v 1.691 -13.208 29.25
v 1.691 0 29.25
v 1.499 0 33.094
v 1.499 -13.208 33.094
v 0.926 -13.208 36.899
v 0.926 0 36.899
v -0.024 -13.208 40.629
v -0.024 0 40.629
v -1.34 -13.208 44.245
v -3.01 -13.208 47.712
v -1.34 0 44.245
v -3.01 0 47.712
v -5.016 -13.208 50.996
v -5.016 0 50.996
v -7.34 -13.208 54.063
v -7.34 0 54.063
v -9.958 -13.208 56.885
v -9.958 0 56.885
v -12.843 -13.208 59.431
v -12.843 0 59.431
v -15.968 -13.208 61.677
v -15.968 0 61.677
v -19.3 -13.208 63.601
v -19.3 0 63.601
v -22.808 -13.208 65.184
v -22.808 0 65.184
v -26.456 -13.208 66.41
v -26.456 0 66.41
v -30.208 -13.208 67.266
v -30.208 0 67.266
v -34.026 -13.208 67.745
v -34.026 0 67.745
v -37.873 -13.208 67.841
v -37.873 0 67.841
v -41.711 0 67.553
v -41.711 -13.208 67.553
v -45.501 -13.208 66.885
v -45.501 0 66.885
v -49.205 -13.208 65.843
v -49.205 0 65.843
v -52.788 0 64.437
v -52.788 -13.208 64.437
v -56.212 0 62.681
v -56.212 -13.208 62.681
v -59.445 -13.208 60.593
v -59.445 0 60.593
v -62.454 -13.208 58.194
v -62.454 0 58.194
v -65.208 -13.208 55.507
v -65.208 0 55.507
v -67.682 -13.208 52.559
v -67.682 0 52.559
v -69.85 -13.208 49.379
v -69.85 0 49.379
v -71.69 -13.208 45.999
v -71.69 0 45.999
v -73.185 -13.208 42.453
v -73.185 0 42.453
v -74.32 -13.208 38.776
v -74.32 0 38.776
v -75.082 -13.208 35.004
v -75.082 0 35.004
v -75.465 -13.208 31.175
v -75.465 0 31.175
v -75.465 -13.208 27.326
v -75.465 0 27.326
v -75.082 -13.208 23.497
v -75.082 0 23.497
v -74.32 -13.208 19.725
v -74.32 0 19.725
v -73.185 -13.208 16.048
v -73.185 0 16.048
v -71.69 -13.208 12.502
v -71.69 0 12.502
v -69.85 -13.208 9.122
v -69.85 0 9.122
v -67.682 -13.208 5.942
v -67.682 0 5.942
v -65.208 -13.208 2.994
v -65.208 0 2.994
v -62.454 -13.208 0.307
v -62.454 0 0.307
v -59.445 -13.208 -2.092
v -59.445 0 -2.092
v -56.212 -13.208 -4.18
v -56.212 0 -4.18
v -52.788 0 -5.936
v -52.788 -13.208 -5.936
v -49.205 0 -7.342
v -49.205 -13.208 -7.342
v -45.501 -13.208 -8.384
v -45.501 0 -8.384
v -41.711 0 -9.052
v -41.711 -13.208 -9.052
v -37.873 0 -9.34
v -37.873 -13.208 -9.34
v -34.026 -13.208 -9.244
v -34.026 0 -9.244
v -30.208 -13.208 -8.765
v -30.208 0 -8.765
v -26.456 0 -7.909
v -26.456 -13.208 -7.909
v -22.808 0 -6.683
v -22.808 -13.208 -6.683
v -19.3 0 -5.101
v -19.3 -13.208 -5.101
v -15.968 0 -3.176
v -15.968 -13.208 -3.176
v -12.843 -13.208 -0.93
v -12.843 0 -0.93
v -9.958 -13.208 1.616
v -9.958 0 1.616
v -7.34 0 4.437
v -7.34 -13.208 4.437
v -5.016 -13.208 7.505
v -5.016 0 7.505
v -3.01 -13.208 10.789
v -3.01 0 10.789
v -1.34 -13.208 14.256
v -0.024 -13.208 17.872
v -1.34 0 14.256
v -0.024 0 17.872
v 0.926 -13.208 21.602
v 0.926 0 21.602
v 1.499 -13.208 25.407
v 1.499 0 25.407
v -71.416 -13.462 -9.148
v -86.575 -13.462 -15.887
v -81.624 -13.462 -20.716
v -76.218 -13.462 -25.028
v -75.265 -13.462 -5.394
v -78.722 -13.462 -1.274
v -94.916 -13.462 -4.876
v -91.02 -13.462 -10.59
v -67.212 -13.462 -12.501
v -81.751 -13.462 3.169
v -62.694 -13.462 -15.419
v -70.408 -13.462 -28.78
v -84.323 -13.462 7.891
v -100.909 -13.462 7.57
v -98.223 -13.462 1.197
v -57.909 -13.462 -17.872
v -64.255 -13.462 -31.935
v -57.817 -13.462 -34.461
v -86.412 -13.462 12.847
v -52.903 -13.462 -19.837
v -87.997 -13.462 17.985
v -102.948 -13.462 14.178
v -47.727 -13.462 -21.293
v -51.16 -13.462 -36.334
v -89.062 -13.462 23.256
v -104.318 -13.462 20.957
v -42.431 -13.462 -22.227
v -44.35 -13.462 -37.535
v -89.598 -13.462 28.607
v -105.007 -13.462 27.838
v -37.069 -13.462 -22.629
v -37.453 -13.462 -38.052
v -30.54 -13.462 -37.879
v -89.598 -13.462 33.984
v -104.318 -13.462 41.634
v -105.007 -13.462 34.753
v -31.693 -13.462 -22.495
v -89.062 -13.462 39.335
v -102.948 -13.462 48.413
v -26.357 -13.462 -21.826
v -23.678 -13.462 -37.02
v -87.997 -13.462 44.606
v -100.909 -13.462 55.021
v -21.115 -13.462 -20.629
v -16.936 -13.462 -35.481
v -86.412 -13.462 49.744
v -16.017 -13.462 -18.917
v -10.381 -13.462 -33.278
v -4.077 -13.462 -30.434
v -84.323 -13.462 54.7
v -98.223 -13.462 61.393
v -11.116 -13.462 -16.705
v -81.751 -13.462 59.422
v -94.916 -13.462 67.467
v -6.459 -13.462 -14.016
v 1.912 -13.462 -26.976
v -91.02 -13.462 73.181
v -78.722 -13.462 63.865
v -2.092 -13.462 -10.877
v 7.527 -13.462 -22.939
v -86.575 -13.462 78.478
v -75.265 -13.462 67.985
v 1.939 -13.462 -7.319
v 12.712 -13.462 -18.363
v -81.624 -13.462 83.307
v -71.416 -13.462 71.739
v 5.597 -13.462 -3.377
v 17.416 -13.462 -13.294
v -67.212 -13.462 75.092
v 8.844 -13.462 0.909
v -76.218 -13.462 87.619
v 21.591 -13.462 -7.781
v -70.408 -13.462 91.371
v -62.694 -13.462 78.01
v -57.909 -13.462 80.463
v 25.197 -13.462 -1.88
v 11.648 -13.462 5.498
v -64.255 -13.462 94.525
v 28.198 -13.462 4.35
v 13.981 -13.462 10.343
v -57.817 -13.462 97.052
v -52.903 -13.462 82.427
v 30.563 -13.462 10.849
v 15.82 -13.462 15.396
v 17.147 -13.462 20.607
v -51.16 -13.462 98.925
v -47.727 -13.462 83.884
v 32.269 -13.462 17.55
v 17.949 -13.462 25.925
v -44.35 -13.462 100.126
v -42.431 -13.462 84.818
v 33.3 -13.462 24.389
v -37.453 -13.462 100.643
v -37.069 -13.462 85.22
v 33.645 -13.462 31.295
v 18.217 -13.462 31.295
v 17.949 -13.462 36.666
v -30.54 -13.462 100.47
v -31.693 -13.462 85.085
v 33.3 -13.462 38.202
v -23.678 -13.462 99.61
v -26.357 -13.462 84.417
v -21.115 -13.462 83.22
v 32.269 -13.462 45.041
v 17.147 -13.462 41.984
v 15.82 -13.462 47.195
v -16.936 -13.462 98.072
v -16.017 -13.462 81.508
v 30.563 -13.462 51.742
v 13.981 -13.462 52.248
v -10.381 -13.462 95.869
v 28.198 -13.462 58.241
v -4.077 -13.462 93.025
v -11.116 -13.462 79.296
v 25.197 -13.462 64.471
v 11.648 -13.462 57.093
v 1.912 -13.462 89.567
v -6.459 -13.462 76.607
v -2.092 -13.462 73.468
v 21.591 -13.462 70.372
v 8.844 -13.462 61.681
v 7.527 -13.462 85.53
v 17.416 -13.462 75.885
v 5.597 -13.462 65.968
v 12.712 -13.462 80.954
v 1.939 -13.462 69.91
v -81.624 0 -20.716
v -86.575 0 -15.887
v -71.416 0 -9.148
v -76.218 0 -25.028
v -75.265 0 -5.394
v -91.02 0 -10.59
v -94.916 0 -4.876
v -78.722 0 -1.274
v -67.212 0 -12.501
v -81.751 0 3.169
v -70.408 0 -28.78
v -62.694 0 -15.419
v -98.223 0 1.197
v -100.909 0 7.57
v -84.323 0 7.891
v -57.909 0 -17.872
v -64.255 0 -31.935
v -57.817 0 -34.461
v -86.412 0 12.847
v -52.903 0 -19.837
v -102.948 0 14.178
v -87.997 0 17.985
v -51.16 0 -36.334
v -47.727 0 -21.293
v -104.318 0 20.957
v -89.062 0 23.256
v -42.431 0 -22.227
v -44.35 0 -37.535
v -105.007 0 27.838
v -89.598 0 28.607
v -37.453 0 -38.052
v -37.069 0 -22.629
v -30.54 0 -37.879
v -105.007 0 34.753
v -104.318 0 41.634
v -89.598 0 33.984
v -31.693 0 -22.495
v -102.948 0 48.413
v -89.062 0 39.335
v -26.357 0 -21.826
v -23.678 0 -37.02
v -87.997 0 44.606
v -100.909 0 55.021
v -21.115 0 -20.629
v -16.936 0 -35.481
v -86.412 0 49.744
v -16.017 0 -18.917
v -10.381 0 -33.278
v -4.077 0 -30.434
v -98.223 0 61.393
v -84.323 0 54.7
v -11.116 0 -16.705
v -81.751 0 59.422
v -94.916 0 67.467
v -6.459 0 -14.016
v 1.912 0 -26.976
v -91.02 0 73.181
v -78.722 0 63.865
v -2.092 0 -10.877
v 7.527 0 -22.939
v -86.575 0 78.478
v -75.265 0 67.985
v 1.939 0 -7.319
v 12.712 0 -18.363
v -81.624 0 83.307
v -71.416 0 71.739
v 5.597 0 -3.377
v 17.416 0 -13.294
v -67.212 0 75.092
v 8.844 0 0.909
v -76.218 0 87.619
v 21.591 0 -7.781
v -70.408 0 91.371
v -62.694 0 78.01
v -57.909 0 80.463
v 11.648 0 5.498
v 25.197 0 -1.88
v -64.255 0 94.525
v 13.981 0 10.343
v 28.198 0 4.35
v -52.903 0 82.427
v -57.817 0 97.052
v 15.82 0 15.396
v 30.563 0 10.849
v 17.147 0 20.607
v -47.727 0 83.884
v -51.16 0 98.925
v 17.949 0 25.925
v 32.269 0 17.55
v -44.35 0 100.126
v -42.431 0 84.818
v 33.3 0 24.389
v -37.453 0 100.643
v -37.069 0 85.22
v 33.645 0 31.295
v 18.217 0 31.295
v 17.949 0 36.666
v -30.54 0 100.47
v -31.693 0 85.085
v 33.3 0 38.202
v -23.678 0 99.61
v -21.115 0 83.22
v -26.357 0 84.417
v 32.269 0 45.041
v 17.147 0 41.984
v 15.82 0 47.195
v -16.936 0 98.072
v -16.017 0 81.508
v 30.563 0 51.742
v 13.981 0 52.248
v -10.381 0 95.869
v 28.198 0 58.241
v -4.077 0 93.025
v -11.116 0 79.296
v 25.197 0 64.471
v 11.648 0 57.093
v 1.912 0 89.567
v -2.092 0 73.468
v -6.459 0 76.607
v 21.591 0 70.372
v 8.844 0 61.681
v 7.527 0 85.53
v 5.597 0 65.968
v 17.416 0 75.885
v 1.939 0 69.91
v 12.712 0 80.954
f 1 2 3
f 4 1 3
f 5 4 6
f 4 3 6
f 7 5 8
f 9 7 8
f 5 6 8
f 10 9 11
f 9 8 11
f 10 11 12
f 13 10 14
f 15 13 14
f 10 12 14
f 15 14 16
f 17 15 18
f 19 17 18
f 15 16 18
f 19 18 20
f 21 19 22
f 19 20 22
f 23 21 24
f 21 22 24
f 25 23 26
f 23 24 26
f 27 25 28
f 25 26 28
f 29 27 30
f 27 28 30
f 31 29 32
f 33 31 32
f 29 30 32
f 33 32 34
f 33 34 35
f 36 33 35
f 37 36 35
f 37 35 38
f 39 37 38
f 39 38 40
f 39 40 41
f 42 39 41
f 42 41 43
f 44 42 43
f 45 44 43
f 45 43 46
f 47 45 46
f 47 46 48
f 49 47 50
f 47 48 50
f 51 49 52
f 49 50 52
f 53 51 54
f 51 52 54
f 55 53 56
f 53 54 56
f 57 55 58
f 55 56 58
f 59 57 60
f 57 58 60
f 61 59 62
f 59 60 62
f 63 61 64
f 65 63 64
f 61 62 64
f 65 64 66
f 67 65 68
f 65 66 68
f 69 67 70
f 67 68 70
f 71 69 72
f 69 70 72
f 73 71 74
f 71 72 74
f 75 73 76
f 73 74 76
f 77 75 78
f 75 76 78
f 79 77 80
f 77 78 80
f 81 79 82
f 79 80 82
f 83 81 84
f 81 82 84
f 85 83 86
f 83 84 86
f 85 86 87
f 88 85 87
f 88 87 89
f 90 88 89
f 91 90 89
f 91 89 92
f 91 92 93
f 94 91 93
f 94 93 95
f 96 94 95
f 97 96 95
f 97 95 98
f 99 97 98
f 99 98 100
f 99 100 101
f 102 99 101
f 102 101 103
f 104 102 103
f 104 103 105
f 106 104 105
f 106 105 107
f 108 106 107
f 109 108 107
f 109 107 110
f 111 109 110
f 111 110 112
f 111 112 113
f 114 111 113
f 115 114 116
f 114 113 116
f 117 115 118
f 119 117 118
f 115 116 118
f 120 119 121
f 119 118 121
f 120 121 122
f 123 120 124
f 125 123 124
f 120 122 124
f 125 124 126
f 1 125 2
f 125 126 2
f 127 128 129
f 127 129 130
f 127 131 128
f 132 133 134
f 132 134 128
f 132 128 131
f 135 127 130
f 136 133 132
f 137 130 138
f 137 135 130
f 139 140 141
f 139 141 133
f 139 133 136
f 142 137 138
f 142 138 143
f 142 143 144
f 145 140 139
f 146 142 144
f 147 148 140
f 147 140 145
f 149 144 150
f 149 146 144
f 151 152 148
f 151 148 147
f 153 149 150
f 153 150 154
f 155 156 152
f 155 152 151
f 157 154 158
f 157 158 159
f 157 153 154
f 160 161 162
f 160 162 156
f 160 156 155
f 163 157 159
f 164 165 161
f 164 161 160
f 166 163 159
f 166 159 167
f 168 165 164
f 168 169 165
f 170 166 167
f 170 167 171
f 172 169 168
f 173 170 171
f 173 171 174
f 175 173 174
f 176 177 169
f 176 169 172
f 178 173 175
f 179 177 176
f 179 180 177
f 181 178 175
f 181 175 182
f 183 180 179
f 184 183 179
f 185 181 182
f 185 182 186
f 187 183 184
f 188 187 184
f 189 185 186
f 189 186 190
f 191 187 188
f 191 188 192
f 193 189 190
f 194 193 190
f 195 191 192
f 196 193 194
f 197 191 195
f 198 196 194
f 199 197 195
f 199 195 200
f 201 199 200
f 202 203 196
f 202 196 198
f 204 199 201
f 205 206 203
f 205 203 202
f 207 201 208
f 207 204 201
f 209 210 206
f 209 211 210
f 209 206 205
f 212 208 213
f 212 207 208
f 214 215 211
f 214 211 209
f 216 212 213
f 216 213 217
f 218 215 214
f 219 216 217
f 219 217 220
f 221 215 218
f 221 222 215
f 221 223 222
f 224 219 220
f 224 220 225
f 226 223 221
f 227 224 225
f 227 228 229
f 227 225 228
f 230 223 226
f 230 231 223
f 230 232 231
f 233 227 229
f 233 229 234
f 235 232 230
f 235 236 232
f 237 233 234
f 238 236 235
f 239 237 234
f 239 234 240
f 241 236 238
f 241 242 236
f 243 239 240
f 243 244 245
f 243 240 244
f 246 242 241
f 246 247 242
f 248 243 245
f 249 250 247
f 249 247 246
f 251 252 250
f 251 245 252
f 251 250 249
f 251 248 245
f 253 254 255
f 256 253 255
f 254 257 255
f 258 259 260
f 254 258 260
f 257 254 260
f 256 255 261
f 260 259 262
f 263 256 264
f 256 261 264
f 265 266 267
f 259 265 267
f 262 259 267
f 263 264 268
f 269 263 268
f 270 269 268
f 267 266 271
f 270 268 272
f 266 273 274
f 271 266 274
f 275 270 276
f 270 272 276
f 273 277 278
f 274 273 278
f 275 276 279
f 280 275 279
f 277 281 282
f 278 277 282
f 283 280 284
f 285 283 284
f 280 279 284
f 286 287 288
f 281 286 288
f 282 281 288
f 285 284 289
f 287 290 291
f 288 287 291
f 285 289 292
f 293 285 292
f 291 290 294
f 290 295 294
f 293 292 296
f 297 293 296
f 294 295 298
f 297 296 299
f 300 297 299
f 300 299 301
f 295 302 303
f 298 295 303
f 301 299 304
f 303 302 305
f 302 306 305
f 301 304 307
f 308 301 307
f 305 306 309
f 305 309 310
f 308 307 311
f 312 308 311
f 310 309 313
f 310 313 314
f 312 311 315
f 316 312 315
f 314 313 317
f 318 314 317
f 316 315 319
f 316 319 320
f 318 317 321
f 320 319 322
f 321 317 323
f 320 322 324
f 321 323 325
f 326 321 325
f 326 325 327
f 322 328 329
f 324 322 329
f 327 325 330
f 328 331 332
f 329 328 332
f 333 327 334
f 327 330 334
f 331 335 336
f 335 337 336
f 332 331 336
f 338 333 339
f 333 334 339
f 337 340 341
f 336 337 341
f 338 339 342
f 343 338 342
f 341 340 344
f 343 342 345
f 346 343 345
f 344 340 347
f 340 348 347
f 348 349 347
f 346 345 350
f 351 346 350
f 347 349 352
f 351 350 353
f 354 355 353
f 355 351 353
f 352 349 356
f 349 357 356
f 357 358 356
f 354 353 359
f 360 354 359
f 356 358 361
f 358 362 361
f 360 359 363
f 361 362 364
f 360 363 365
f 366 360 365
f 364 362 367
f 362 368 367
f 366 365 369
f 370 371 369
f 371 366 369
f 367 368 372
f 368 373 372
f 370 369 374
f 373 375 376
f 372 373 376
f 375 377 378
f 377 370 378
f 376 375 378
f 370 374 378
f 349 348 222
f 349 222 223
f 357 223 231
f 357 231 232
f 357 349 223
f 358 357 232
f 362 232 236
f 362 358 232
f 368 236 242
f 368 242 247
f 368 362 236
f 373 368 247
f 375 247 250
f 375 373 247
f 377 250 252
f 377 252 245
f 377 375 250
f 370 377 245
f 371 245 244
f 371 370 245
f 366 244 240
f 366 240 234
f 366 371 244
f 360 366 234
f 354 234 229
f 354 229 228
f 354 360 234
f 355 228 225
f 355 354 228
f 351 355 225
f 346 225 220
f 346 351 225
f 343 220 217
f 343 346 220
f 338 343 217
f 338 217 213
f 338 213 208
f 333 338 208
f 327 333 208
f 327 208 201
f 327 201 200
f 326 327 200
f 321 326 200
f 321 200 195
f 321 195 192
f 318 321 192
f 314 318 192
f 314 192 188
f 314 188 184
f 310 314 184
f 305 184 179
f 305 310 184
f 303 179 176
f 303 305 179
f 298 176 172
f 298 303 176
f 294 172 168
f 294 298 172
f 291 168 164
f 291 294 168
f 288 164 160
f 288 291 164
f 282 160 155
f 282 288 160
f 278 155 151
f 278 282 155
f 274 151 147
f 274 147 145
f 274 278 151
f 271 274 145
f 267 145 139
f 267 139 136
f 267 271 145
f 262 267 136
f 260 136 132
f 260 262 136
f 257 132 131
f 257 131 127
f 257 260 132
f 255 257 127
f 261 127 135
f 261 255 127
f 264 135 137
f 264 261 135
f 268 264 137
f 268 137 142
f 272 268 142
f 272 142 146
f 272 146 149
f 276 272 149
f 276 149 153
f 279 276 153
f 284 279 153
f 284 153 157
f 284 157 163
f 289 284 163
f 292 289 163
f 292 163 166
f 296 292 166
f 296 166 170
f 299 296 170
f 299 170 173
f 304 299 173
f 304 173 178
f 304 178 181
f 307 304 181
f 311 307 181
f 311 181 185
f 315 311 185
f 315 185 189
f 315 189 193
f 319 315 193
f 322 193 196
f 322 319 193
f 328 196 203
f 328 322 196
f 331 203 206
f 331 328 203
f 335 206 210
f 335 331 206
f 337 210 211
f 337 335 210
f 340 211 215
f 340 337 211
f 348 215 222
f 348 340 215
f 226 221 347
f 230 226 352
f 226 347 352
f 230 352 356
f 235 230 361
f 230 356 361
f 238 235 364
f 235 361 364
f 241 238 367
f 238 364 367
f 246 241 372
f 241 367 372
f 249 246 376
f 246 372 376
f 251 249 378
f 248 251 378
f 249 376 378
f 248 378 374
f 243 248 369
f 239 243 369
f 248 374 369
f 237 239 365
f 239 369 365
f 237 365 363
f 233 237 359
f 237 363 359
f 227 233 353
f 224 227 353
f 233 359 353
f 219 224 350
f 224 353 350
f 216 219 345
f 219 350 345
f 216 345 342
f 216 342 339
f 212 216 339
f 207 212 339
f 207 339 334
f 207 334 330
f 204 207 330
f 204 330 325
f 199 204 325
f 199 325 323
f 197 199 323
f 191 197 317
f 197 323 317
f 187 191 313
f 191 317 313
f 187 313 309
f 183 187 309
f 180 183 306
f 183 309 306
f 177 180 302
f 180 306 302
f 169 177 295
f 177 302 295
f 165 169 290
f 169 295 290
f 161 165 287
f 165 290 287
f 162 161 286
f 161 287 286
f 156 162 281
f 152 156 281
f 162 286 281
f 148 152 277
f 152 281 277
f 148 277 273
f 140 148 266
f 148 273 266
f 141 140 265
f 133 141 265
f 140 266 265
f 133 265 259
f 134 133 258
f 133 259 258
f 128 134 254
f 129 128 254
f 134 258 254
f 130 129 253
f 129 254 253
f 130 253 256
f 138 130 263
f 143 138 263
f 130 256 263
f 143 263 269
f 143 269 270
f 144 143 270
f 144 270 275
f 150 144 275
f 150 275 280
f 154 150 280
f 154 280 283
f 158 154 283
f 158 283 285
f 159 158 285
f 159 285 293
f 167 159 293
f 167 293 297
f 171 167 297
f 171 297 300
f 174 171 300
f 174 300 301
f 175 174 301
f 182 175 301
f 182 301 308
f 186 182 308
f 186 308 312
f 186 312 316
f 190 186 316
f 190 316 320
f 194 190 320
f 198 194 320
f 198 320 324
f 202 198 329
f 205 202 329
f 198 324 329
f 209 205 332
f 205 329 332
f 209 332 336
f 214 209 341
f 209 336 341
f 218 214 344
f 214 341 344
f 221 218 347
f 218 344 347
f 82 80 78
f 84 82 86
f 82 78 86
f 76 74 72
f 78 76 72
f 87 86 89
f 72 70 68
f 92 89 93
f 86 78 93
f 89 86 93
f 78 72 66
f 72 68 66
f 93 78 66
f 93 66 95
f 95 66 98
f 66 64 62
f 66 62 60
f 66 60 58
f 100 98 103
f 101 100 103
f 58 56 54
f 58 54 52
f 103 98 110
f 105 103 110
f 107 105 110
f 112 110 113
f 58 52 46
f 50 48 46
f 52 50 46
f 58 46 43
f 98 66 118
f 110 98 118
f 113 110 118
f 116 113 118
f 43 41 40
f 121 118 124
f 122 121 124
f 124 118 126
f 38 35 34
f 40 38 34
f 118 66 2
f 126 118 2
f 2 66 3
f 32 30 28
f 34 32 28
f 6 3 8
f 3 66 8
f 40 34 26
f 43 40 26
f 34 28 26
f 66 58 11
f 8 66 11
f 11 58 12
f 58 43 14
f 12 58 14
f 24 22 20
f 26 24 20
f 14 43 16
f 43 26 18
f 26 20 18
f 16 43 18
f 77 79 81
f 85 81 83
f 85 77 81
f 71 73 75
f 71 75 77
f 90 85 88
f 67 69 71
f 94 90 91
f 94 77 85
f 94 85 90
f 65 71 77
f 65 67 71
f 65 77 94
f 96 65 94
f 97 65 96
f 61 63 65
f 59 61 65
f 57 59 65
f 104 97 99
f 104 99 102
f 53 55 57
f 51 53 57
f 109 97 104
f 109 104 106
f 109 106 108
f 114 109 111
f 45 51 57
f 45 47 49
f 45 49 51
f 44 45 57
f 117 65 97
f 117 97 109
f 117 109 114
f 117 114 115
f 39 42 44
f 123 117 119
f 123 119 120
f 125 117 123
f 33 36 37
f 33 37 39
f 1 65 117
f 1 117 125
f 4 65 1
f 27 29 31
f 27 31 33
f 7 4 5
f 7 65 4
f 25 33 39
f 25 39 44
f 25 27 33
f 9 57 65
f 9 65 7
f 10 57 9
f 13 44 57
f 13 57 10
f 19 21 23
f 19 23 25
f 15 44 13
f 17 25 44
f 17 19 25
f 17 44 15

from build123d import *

# Parameters (mm, degrees)
F0_R     = 69.368802
F0_R_2   = 53.940896
F1_DEPTH = 13.462
F2_R     = 38.602197
F3_DEPTH = 13.208


with BuildPart() as f1:
    # F0 (on Front) → F1 (new body)
    with BuildSketch(Plane.XZ):
        with Locations((-35.724021, 31.295426)):
            Circle(F0_R)
        with Locations((-35.724021, 31.295426)):
            Circle(F0_R_2, mode=Mode.SUBTRACT)
    extrude(amount=F1_DEPTH)


with BuildPart() as f3:
    # F2 (on Front) → F3 (new body)
    with BuildSketch(Plane.XZ):
        with Locations((-36.910988, 29.250469)):
            Circle(F2_R)
    extrude(amount=F3_DEPTH)


solid = Compound([f1.part, f3.part])
